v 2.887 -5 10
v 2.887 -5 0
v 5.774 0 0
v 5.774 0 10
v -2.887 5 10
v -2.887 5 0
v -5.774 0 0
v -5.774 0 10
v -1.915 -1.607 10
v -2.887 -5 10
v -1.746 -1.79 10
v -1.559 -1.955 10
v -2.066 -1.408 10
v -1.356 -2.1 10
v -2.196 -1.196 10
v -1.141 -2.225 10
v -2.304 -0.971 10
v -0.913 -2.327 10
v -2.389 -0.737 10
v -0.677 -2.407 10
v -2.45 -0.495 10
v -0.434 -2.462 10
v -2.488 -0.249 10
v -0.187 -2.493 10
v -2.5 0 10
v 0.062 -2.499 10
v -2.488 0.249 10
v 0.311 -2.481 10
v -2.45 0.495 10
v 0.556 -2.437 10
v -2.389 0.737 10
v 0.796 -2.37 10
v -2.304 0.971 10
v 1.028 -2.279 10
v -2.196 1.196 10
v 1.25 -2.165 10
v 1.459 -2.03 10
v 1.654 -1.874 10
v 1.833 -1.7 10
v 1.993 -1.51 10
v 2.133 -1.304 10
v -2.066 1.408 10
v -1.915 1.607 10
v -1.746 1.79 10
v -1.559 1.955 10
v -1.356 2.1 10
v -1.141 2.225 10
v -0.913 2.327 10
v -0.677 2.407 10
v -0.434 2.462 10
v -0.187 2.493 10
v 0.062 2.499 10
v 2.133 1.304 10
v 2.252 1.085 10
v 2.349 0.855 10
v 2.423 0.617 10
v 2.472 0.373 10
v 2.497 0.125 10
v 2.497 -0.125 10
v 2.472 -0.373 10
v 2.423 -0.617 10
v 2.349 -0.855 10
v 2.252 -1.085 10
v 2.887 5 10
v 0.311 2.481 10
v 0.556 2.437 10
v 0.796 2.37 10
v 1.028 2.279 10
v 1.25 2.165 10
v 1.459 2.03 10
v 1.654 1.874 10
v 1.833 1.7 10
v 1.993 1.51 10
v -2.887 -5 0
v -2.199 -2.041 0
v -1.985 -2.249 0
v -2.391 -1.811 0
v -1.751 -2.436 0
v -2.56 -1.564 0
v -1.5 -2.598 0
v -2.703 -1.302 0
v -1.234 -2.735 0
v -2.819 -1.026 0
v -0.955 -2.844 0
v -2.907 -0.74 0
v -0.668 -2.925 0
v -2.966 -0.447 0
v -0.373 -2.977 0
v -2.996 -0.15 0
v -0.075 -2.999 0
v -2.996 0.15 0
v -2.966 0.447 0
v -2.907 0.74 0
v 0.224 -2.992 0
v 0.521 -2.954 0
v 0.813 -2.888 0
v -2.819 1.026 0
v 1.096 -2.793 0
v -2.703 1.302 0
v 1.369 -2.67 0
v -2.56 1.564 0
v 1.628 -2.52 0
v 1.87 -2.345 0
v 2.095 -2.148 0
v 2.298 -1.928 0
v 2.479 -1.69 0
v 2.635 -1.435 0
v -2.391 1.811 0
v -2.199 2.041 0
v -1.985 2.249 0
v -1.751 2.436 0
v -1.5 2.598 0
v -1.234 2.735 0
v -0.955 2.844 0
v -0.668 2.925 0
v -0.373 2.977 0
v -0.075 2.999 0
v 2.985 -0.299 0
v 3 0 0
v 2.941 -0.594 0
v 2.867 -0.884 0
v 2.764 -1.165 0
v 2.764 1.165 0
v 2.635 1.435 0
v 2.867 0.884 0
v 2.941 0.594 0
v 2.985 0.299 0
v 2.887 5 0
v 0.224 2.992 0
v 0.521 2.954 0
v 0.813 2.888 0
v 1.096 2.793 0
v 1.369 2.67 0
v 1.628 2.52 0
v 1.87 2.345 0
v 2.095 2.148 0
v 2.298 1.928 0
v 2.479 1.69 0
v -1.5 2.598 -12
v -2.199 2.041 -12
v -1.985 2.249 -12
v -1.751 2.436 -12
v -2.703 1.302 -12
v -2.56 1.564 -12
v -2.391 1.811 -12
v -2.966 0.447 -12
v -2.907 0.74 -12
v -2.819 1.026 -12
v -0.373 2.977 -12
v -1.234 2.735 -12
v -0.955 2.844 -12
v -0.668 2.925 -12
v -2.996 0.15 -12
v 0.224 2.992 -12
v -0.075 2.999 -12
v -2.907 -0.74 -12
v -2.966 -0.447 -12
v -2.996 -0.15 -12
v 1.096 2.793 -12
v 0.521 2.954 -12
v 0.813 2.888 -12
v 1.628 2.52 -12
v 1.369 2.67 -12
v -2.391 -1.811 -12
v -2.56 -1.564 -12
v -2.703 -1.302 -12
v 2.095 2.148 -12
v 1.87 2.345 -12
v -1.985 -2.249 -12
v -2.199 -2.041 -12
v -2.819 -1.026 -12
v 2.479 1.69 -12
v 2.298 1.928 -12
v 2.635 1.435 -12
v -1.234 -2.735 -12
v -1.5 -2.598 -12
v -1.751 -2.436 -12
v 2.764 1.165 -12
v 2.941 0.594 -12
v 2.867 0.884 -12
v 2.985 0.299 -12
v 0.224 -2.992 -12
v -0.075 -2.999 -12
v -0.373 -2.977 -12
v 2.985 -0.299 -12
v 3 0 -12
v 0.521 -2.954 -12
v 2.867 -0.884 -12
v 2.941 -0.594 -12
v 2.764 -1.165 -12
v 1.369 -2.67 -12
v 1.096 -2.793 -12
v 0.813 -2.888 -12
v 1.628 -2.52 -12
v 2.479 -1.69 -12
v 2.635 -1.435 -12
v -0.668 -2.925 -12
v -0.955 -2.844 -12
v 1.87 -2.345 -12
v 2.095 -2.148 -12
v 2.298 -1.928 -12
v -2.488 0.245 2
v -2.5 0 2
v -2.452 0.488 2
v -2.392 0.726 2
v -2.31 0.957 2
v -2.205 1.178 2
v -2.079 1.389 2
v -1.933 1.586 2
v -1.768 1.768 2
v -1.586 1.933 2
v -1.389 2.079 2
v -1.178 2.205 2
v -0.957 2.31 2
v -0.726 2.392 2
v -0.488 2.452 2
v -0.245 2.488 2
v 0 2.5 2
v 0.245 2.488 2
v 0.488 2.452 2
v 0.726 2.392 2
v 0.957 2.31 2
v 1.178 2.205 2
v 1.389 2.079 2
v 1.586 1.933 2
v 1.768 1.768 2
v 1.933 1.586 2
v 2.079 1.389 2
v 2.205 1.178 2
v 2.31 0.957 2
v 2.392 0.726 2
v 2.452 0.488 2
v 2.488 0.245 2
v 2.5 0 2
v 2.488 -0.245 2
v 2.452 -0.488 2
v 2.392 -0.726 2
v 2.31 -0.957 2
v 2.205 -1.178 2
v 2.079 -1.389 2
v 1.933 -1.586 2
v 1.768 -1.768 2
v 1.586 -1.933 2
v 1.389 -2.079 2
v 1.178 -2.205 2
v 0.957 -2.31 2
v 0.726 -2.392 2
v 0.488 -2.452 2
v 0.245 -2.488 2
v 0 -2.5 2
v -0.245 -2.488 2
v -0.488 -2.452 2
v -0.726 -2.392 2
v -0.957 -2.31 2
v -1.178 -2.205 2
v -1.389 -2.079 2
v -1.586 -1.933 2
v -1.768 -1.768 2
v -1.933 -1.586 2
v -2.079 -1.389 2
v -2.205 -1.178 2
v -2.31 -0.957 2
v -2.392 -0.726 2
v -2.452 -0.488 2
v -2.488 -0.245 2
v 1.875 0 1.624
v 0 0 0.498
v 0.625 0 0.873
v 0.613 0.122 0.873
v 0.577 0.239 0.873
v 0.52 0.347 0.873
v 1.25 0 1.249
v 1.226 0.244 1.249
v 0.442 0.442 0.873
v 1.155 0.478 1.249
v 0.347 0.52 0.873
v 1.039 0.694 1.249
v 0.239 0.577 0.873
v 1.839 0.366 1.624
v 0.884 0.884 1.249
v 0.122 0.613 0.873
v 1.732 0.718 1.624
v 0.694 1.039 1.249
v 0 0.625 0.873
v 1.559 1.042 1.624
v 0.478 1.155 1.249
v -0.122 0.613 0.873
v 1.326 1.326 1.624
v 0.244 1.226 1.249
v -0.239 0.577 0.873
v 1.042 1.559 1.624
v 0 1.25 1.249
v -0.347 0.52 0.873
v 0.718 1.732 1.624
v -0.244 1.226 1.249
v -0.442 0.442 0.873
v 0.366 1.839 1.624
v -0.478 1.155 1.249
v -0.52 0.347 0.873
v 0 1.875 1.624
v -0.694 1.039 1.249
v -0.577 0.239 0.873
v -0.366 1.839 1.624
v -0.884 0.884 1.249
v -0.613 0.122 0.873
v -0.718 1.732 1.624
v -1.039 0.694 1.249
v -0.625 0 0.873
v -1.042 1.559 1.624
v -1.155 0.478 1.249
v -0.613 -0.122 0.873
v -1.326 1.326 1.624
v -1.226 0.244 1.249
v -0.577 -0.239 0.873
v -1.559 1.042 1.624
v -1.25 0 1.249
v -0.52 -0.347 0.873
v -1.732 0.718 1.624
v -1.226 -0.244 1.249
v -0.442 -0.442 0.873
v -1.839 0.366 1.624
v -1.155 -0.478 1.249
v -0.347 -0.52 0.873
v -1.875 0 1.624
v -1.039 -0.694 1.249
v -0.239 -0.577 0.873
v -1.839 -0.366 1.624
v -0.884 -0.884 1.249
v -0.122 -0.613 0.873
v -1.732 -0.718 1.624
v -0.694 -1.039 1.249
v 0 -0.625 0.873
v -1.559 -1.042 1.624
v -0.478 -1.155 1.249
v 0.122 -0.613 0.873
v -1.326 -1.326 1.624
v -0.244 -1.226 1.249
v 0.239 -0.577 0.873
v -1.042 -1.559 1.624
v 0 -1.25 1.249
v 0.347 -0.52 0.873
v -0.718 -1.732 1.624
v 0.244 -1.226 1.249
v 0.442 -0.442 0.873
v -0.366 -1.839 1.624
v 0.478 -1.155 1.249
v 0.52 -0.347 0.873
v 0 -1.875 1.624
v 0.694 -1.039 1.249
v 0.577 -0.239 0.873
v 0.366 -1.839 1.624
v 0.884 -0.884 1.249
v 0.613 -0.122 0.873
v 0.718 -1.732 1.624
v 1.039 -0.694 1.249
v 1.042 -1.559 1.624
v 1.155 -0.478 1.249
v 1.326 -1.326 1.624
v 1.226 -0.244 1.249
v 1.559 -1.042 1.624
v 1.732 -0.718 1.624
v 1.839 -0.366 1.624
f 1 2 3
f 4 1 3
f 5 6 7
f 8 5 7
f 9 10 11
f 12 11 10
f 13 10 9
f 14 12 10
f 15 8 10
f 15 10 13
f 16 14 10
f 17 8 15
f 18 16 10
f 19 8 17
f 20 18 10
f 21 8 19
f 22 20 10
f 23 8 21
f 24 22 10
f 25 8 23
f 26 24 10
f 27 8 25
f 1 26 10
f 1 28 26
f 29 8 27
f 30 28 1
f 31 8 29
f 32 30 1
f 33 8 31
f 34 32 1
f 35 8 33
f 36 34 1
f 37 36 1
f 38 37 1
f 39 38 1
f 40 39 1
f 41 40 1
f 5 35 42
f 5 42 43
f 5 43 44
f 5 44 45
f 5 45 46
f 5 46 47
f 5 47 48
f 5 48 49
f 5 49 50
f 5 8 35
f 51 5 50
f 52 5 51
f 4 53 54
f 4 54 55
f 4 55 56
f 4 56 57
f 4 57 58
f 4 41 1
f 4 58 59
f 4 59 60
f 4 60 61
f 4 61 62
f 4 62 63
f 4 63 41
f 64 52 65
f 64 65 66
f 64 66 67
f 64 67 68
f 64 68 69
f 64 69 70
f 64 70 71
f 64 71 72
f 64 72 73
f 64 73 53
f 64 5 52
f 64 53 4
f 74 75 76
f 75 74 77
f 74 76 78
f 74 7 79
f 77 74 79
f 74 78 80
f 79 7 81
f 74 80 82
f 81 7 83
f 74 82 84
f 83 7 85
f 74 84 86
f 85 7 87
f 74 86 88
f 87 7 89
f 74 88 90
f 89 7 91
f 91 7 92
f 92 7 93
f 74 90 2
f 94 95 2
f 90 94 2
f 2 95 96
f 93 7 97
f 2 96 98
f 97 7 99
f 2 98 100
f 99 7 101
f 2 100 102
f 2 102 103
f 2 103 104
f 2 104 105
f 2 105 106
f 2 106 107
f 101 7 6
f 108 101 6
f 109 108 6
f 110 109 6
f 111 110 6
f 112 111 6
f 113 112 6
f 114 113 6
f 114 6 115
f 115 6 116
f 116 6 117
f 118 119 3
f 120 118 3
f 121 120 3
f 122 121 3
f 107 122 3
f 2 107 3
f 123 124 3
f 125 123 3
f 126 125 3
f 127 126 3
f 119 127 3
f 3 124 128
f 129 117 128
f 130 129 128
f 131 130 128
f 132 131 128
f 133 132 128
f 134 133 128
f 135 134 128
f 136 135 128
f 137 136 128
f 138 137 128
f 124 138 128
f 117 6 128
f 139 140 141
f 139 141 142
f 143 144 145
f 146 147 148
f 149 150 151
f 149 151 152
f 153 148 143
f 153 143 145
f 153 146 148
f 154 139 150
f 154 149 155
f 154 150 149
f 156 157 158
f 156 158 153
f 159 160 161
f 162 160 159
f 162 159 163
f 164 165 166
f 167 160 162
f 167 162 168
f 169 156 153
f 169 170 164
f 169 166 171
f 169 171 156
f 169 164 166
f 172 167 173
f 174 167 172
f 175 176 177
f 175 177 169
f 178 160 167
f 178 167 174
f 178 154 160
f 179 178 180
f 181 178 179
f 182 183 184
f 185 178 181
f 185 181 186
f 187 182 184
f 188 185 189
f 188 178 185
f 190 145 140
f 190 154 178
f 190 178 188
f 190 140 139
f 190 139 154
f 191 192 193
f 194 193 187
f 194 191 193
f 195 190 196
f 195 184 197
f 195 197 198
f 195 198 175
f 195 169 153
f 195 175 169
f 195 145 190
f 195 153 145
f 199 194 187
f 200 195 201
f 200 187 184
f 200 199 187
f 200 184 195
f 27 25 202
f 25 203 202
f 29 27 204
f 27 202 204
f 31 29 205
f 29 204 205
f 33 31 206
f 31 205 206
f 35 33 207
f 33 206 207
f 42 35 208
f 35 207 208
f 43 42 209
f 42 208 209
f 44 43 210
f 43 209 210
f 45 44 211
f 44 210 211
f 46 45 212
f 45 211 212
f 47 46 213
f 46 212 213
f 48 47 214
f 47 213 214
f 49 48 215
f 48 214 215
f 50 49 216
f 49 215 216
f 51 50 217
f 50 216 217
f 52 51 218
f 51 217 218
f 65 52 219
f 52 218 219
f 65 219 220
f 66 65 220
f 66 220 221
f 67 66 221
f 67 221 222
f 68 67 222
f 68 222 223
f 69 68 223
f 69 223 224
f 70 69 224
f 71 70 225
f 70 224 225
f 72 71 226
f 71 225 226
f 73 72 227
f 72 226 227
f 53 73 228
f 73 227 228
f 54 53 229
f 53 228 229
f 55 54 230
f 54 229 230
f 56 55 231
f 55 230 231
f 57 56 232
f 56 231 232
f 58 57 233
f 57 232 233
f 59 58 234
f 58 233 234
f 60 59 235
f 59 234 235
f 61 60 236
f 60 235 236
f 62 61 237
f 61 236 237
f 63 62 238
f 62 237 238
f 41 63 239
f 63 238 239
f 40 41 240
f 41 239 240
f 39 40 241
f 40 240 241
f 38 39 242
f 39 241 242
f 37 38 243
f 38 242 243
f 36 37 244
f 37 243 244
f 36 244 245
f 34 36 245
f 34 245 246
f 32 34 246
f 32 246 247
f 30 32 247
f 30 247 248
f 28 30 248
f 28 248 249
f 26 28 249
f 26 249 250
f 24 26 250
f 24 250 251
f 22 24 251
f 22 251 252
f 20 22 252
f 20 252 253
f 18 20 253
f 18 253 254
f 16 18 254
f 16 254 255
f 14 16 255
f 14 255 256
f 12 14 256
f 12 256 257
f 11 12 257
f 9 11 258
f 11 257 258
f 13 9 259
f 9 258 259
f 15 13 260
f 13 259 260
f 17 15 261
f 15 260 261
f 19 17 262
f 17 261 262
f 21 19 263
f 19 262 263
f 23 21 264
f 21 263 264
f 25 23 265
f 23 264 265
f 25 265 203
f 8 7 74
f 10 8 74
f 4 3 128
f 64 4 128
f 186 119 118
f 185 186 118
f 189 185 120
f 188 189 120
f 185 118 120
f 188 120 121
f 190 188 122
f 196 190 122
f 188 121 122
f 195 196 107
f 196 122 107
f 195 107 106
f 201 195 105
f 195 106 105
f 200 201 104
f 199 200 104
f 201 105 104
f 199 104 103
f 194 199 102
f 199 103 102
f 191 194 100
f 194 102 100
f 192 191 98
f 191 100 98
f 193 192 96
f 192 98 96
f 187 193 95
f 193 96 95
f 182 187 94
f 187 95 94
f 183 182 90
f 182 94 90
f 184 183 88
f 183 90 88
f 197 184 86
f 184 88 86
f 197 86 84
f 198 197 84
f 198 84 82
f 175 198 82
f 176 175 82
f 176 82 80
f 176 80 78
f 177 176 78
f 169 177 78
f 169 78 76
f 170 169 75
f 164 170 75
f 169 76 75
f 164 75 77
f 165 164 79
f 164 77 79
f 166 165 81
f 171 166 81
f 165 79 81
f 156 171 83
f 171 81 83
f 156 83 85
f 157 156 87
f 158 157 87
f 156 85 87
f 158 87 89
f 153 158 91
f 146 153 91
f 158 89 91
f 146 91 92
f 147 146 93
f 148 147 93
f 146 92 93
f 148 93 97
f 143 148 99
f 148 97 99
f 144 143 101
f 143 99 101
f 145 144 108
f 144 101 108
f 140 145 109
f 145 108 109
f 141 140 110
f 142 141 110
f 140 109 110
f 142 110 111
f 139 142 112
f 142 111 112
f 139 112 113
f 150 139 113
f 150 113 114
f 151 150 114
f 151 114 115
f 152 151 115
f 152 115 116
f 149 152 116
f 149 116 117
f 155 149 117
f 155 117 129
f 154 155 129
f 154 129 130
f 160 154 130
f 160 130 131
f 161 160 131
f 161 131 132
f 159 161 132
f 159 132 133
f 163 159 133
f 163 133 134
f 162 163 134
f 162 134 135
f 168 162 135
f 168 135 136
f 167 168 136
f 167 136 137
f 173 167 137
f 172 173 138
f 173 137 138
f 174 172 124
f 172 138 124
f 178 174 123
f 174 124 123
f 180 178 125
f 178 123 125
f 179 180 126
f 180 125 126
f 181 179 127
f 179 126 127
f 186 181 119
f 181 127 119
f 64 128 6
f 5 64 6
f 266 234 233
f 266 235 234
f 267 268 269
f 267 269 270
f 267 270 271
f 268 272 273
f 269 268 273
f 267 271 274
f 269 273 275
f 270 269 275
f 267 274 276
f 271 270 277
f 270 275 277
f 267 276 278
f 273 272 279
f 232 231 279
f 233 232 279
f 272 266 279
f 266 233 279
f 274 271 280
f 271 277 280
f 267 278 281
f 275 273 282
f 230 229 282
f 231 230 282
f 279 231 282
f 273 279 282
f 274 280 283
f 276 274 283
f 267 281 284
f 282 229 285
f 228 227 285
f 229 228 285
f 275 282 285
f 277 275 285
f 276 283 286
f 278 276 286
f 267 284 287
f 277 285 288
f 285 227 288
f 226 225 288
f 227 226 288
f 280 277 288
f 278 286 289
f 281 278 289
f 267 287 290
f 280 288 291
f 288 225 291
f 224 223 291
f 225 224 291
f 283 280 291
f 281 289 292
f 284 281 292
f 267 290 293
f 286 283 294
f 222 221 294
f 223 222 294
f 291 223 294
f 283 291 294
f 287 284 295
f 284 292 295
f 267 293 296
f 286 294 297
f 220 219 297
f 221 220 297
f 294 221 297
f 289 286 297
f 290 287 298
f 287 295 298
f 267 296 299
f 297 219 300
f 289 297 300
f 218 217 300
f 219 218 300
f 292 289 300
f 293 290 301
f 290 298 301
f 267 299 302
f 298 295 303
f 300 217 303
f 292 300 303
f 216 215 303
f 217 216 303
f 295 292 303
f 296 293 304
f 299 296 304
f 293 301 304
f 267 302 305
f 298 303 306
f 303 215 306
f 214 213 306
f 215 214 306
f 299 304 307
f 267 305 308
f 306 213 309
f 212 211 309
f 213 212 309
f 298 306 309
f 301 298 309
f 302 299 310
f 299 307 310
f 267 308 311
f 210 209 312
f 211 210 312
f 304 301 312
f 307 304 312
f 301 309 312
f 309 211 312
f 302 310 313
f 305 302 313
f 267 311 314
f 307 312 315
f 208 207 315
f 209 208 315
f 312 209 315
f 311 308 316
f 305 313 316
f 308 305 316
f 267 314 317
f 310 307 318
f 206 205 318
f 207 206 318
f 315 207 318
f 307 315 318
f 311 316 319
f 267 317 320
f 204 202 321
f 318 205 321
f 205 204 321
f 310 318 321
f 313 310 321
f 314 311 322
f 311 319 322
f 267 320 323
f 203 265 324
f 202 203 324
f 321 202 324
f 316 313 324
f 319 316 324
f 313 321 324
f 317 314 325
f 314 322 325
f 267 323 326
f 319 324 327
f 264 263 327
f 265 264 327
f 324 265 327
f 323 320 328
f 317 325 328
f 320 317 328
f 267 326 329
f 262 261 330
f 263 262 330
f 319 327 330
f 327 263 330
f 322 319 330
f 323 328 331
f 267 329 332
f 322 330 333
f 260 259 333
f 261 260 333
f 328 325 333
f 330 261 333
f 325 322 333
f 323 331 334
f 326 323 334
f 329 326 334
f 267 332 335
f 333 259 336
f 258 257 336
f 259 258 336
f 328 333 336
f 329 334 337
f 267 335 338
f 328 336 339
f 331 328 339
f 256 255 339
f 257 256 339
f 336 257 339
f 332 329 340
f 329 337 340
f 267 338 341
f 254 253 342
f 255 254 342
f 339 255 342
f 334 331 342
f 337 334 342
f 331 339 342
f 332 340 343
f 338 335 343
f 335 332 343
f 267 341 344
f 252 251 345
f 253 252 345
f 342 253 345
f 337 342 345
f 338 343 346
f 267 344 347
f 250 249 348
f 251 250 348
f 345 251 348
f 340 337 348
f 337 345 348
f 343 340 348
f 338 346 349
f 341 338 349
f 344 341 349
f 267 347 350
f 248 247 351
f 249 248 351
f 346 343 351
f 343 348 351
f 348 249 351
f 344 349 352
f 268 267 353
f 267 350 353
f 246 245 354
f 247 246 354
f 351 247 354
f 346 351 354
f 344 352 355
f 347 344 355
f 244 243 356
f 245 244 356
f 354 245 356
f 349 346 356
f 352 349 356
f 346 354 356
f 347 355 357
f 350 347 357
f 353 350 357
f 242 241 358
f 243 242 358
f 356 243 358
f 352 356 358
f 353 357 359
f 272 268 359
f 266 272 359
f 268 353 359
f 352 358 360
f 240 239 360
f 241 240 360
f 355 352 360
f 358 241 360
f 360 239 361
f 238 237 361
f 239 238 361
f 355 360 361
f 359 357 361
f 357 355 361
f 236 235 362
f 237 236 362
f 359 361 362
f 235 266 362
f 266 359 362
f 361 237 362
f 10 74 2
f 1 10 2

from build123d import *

# Parameters (mm, degrees)
F1_DEPTH = 10
F3_D     = 5
F3_DEPTH = 8
F3_TIP   = 1.5021515476
F4_R     = 3
F5_DEPTH = 12


with BuildPart() as f1:
    # F0 (on Top) → F1 (new body)
    with BuildSketch(Plane.XY):
        Polygon((2.8867513459, 5), (-2.8867513459, 5), (-5.7735026919, 0), (-2.8867513459, -5), (2.8867513459, -5), (5.7735026919, 0), align=None)
    extrude(amount=F1_DEPTH)

    # F3
    with Locations(Plane.XY.offset(10)):
        with Locations((0, 0)):
            Hole(F3_D / 2, depth=F3_DEPTH)
            with Locations((0, 0, -(F3_DEPTH + F3_TIP / 2))):  # 118° drill point
                Cone(0, F3_D / 2, F3_TIP, mode=Mode.SUBTRACT)

    # F4 (on face) → F5 (join)
    with BuildSketch(Plane(origin=(0, 0, 0), x_dir=(1, 0, 0), z_dir=(0, 0, -1))):
        Circle(F4_R)
    extrude(amount=F5_DEPTH)


solid = f1.part
